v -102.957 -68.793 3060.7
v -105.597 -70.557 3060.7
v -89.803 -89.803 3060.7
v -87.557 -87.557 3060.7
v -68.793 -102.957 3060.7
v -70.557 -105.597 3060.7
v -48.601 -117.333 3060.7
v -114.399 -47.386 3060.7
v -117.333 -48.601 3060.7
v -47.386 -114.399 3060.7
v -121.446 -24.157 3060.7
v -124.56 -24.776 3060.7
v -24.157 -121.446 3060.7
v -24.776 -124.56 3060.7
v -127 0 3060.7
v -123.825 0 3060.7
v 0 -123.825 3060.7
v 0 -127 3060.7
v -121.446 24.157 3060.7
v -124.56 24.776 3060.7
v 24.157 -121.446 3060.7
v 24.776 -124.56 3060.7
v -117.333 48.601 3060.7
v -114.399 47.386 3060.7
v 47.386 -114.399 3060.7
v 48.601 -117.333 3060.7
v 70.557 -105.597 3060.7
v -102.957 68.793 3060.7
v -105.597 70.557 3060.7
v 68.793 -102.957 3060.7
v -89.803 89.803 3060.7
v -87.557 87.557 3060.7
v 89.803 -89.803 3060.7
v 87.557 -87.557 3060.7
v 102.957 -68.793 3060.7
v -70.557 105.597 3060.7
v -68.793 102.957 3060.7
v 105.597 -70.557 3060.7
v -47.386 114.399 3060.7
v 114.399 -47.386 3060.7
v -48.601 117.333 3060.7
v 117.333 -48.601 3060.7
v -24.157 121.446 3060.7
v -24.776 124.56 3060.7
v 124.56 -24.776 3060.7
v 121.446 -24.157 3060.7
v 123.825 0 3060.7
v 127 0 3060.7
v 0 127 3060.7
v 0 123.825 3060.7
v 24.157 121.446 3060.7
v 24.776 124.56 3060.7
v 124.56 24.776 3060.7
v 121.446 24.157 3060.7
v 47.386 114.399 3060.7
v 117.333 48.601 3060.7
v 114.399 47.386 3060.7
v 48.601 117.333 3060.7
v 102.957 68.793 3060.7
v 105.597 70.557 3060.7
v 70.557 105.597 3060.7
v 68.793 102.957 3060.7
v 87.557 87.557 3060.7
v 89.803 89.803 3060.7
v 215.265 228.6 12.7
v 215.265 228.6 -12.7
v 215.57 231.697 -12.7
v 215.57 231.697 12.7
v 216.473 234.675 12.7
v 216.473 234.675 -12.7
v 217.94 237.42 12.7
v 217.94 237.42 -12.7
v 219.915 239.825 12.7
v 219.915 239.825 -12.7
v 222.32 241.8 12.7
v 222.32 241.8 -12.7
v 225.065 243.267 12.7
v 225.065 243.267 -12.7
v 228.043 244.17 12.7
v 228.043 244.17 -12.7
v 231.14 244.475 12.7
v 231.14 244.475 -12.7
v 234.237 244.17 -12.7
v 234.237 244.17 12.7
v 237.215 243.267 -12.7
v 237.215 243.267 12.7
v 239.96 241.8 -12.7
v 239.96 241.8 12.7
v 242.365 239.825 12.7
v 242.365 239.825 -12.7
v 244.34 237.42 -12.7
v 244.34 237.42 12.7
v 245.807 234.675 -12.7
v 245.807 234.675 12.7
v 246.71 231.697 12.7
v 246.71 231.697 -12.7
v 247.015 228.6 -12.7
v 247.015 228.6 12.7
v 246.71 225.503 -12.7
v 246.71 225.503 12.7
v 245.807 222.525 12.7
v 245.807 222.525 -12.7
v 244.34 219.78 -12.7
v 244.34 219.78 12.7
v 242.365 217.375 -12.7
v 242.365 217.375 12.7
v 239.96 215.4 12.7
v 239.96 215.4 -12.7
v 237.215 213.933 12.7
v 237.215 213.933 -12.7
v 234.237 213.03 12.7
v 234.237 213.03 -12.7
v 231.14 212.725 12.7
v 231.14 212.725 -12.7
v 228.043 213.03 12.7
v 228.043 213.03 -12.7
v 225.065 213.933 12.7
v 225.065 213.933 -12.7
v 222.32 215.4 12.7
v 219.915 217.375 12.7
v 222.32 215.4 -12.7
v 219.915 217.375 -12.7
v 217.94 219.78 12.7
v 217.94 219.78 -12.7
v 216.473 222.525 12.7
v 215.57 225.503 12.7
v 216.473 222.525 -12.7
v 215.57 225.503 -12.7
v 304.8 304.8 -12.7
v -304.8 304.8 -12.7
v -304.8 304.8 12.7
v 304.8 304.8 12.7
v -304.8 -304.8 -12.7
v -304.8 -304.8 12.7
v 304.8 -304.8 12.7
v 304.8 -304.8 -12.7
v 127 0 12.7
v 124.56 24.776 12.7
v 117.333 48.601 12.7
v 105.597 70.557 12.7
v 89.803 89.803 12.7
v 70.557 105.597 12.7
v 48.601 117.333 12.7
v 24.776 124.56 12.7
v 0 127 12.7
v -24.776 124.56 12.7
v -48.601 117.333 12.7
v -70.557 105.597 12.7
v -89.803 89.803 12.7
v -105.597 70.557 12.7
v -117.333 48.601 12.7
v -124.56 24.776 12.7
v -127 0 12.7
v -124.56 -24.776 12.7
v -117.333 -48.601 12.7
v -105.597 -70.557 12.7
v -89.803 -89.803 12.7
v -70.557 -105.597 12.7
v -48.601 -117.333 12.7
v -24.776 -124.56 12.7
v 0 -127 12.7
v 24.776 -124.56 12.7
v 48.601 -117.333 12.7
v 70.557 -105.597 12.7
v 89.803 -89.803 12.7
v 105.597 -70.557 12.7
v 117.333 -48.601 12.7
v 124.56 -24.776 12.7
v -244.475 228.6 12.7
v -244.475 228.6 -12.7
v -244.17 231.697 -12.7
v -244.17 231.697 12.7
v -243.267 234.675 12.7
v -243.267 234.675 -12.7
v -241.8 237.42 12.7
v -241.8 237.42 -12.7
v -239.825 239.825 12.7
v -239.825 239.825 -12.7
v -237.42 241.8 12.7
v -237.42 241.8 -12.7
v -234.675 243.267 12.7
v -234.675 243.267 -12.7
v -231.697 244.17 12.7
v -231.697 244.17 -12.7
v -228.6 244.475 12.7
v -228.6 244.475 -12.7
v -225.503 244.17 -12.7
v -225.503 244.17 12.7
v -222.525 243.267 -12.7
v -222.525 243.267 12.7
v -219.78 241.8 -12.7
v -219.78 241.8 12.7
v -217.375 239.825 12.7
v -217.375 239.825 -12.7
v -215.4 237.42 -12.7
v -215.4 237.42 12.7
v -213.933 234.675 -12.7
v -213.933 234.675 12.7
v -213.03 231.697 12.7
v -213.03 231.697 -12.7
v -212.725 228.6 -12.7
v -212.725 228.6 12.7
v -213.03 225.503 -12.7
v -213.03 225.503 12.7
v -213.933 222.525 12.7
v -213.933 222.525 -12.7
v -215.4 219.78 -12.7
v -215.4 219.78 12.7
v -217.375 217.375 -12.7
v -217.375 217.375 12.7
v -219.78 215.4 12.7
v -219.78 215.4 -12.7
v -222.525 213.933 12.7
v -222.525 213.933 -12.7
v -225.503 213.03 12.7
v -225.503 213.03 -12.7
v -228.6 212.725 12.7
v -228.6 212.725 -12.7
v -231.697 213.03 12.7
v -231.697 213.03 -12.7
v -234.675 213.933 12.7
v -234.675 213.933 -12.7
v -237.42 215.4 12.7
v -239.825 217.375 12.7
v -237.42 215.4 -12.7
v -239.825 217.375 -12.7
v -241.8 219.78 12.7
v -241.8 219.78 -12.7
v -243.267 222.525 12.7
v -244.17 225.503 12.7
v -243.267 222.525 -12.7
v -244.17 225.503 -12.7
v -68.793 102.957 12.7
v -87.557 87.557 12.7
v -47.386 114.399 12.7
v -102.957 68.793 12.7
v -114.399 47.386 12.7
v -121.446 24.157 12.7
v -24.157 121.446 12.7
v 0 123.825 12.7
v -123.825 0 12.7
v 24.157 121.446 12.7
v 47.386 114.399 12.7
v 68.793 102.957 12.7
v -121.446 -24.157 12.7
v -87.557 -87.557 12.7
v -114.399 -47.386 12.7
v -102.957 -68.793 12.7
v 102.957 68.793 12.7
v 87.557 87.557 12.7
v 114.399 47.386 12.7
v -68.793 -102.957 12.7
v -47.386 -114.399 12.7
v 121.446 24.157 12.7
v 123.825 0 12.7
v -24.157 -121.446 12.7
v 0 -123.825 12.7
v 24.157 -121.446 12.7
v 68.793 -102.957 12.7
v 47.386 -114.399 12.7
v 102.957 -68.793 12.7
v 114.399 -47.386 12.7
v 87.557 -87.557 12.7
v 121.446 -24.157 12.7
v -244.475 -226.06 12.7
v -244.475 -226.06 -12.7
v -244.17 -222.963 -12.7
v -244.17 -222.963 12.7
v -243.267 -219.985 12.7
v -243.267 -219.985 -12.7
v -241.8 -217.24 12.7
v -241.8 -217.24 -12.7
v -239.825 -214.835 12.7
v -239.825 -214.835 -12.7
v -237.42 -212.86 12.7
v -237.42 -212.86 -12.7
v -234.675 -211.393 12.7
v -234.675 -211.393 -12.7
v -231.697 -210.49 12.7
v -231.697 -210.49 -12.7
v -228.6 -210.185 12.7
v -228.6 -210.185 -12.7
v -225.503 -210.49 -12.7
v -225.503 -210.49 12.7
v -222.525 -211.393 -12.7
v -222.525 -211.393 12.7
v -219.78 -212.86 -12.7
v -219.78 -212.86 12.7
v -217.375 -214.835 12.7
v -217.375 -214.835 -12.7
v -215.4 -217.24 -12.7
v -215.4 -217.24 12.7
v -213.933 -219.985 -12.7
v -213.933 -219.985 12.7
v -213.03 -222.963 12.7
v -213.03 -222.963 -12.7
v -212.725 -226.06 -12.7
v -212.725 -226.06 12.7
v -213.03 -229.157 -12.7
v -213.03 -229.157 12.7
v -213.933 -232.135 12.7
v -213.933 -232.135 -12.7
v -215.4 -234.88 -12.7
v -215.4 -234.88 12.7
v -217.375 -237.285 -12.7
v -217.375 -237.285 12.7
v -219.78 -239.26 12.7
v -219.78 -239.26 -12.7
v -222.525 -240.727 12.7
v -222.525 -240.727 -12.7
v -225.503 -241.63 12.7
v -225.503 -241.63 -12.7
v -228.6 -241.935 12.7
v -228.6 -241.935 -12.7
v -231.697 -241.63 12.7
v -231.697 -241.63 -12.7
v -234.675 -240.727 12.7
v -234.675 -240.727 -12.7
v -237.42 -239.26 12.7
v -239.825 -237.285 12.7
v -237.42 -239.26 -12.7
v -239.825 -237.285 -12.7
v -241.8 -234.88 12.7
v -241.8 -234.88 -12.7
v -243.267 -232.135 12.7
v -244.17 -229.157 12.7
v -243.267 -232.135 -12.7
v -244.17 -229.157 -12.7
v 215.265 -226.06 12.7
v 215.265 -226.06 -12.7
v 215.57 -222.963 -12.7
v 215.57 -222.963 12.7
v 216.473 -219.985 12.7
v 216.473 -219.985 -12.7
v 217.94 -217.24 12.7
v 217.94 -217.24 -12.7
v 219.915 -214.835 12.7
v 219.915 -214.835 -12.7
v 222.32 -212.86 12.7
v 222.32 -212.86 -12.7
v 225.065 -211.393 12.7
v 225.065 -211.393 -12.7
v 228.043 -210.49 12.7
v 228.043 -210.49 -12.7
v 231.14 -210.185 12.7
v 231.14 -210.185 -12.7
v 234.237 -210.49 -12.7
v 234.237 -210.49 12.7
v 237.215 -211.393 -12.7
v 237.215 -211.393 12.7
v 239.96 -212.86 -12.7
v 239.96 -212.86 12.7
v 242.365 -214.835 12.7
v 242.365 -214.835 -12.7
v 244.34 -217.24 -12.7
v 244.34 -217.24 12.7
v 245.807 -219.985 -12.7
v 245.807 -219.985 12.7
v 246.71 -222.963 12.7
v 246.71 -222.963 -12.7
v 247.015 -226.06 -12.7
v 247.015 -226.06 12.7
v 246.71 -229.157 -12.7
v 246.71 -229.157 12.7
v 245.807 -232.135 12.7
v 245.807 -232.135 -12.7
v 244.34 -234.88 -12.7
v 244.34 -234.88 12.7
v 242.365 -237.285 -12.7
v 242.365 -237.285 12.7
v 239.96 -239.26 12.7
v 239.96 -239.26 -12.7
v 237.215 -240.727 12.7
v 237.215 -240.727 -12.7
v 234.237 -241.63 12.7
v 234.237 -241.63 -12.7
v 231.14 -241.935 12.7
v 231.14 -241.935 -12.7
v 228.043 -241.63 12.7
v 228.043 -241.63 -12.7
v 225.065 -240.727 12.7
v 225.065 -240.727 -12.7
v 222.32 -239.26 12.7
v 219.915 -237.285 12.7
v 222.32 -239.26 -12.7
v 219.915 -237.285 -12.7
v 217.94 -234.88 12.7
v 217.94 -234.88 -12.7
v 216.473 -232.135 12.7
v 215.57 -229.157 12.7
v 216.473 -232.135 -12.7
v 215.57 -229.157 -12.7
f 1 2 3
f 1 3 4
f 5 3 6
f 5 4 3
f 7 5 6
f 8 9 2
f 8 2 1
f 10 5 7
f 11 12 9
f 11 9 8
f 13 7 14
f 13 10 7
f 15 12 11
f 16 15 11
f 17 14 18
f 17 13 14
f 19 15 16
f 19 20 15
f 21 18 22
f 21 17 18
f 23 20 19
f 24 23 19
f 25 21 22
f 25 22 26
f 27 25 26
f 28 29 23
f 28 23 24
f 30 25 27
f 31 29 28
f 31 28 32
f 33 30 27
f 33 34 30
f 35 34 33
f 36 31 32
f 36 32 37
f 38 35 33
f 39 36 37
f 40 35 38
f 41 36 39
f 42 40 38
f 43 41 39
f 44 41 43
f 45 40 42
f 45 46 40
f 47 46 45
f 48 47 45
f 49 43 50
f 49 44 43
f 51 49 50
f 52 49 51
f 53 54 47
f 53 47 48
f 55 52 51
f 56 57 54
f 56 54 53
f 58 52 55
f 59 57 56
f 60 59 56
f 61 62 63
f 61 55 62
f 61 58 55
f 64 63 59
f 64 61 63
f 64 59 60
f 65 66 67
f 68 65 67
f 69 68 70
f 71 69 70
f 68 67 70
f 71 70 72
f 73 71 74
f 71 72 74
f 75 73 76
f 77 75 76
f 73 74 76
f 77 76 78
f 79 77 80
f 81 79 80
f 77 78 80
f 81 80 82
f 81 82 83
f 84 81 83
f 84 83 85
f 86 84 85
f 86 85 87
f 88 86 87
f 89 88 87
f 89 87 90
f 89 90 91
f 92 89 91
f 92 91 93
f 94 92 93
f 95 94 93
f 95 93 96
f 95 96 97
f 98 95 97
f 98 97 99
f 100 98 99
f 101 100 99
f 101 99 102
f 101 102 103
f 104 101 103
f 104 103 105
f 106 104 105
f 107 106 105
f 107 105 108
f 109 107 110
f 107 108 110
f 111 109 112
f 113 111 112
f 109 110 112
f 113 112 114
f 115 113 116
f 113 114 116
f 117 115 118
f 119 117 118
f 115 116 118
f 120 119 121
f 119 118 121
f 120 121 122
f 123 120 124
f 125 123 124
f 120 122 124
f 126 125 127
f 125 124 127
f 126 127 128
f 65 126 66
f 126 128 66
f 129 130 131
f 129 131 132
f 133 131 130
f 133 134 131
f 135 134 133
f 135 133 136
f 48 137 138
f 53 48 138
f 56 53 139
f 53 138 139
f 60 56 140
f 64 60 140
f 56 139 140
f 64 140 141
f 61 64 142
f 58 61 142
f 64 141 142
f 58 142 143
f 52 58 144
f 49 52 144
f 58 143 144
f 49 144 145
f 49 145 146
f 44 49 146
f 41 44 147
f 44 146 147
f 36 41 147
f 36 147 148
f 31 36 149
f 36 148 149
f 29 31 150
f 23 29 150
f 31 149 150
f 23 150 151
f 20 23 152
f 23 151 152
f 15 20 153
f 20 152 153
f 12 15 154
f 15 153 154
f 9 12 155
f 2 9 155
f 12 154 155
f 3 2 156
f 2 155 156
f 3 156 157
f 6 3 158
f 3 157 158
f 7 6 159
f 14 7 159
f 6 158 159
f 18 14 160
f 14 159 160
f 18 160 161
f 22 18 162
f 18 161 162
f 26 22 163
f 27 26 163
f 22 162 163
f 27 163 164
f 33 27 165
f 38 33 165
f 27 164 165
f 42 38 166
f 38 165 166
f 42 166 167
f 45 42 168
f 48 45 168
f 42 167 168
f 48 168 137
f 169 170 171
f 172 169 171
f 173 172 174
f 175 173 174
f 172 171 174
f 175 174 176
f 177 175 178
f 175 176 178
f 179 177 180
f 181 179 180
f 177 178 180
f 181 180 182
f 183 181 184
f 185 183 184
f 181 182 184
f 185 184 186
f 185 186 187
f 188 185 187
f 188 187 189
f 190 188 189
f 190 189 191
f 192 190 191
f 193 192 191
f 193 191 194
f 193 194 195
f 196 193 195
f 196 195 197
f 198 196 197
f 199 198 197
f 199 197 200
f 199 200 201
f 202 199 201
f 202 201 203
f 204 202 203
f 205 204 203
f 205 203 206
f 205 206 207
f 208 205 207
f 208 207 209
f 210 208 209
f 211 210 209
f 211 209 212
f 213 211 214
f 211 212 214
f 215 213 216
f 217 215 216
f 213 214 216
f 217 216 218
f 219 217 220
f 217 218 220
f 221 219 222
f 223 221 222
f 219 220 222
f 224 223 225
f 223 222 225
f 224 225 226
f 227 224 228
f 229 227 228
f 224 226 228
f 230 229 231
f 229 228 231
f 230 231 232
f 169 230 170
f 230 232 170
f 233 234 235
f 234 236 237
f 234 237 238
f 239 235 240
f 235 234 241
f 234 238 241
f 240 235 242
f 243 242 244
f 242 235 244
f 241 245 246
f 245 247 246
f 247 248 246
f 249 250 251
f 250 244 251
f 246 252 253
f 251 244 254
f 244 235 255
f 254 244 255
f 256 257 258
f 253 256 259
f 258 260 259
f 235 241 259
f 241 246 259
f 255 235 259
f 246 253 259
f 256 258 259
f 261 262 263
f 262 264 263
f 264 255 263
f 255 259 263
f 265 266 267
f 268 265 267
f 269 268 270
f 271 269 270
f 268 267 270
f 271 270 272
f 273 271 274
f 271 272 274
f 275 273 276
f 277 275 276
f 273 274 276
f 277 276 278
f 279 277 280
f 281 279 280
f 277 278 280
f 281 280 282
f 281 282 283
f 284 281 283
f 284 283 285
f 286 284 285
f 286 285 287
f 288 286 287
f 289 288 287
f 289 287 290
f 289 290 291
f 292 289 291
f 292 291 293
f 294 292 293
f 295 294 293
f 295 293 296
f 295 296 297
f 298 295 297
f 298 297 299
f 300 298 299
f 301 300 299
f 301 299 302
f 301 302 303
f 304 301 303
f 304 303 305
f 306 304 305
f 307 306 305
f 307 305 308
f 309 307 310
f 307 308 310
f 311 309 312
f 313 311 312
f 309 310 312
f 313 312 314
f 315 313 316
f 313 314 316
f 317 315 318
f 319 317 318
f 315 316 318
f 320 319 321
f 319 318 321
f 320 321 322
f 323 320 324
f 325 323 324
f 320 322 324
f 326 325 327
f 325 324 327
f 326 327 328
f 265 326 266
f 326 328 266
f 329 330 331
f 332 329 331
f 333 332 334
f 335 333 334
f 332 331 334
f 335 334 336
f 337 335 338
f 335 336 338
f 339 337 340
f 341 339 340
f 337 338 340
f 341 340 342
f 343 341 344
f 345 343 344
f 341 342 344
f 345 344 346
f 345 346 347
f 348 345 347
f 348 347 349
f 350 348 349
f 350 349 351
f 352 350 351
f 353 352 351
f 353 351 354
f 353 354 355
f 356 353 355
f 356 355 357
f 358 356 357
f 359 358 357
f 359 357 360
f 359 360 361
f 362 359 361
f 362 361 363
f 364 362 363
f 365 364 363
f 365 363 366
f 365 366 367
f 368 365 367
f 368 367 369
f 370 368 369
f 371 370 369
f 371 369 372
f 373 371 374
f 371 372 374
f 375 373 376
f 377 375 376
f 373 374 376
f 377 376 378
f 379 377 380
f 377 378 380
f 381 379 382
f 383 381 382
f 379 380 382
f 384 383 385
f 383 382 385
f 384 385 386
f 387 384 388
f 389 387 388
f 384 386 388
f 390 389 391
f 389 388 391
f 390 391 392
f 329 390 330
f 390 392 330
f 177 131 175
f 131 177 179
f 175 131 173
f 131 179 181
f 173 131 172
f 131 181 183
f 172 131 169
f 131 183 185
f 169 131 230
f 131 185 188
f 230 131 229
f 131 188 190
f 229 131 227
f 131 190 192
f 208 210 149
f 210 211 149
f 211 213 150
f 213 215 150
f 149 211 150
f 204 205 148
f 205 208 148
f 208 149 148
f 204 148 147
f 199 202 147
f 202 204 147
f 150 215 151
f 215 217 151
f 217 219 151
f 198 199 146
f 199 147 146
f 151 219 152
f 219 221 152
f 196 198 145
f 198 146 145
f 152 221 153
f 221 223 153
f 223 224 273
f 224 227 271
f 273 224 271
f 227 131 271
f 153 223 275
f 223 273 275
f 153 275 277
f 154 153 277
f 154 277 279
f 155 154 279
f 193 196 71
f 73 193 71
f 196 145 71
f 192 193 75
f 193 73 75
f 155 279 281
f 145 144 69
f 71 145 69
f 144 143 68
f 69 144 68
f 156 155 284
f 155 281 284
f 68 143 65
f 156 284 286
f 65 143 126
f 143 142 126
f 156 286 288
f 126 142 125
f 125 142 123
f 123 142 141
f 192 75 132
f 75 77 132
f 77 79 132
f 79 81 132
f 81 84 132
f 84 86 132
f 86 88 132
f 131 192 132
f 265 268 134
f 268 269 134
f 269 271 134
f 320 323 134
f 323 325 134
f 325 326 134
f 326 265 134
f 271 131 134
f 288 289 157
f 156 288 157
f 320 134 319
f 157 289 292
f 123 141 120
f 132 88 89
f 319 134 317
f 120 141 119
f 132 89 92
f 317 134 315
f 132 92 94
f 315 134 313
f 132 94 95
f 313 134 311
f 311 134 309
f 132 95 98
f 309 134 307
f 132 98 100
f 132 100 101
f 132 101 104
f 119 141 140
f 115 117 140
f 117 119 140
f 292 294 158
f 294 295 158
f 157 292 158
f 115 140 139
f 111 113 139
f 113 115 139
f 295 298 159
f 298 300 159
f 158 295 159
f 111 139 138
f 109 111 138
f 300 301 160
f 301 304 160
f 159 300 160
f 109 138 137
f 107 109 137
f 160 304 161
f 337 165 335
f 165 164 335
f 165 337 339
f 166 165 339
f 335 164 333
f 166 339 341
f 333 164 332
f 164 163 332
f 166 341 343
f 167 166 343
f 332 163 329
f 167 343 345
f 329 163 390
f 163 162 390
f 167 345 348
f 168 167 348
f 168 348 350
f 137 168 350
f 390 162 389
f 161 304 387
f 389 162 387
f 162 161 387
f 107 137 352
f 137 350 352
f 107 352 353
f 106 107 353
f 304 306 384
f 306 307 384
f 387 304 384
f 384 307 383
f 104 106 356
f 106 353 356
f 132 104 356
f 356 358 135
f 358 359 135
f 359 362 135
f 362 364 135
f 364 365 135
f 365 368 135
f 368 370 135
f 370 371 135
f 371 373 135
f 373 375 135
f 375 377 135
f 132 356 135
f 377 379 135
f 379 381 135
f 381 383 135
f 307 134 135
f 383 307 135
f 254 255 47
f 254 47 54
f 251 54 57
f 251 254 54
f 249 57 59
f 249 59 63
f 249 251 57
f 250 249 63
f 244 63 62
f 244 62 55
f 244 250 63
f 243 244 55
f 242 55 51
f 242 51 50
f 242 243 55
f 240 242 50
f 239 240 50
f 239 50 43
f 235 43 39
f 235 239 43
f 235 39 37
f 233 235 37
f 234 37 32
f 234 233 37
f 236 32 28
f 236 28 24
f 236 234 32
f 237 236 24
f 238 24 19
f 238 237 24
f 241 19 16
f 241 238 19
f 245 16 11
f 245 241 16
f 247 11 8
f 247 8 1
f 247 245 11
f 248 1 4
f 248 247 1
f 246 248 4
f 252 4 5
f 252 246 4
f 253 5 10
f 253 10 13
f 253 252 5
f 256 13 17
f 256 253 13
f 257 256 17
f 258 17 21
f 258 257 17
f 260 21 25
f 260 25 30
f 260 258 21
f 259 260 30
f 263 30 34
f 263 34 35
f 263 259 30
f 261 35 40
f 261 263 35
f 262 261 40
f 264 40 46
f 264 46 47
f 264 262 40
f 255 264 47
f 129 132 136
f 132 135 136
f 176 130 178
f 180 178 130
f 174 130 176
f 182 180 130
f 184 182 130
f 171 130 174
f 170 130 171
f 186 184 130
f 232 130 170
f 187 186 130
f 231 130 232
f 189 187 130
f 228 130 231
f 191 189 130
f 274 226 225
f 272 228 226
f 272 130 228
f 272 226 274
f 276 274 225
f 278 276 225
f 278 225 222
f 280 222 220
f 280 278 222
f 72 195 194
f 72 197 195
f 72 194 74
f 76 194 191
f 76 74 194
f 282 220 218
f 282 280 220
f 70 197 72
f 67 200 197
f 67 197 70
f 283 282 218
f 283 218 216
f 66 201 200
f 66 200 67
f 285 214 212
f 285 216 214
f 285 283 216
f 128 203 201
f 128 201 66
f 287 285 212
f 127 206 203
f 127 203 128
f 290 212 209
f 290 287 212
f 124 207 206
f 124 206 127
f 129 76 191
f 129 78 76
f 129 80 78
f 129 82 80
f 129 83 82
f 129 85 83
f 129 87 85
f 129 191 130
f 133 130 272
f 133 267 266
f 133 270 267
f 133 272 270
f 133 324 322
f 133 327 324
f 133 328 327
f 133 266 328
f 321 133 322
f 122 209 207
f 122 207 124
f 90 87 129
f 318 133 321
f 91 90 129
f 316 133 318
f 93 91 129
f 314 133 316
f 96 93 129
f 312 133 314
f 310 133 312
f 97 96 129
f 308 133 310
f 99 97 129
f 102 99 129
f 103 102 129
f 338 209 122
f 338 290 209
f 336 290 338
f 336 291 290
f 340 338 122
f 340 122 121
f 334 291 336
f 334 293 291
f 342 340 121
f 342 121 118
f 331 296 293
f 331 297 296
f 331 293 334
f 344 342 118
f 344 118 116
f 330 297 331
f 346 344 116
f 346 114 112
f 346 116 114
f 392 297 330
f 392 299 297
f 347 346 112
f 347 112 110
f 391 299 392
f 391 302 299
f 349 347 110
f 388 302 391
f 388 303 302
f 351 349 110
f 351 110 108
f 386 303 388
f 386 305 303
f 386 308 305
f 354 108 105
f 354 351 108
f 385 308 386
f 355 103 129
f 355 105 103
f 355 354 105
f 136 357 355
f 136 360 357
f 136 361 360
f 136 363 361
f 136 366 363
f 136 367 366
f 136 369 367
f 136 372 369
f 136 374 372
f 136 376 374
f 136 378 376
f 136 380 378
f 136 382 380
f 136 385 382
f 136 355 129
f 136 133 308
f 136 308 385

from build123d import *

# Parameters (mm, degrees)
F0_W      = 609.6
F0_H      = 25.4
F1_DEPTH  = 304.8
F1_FACE_W = 609.6
F1_FACE_H = 25.4
F2_DEPTH  = 304.8
F3_R      = 127
F3_R_2    = 123.825
F4_DEPTH  = 3048
F6_D      = 31.75


with BuildPart() as f1:
    # F0 (on Front) → F1 (new body)
    with BuildSketch(Plane.XZ):
        Rectangle(F0_W, F0_H)
    extrude(amount=F1_DEPTH)

    # F1_face (on face) → F2 (join)
    with BuildSketch(Plane(origin=(0, 0, 0), x_dir=(1, 0, 0), z_dir=(0, 1, 0))):
        Rectangle(F1_FACE_W, F1_FACE_H)
    extrude(amount=F2_DEPTH)

    # F3 (on face) → F4 (join)
    with BuildSketch(Plane.XY.offset(12.7)):
        Circle(F3_R)
        Circle(F3_R_2, mode=Mode.SUBTRACT)
    extrude(amount=F4_DEPTH)

    # F6 (through all)
    with Locations(Plane.XY.offset(12.7)):
        with Locations((-228.6, 228.6), (-228.6, -226.06), (231.14, -226.06), (231.14, 228.6)):
            Hole(F6_D / 2)


solid = f1.part
